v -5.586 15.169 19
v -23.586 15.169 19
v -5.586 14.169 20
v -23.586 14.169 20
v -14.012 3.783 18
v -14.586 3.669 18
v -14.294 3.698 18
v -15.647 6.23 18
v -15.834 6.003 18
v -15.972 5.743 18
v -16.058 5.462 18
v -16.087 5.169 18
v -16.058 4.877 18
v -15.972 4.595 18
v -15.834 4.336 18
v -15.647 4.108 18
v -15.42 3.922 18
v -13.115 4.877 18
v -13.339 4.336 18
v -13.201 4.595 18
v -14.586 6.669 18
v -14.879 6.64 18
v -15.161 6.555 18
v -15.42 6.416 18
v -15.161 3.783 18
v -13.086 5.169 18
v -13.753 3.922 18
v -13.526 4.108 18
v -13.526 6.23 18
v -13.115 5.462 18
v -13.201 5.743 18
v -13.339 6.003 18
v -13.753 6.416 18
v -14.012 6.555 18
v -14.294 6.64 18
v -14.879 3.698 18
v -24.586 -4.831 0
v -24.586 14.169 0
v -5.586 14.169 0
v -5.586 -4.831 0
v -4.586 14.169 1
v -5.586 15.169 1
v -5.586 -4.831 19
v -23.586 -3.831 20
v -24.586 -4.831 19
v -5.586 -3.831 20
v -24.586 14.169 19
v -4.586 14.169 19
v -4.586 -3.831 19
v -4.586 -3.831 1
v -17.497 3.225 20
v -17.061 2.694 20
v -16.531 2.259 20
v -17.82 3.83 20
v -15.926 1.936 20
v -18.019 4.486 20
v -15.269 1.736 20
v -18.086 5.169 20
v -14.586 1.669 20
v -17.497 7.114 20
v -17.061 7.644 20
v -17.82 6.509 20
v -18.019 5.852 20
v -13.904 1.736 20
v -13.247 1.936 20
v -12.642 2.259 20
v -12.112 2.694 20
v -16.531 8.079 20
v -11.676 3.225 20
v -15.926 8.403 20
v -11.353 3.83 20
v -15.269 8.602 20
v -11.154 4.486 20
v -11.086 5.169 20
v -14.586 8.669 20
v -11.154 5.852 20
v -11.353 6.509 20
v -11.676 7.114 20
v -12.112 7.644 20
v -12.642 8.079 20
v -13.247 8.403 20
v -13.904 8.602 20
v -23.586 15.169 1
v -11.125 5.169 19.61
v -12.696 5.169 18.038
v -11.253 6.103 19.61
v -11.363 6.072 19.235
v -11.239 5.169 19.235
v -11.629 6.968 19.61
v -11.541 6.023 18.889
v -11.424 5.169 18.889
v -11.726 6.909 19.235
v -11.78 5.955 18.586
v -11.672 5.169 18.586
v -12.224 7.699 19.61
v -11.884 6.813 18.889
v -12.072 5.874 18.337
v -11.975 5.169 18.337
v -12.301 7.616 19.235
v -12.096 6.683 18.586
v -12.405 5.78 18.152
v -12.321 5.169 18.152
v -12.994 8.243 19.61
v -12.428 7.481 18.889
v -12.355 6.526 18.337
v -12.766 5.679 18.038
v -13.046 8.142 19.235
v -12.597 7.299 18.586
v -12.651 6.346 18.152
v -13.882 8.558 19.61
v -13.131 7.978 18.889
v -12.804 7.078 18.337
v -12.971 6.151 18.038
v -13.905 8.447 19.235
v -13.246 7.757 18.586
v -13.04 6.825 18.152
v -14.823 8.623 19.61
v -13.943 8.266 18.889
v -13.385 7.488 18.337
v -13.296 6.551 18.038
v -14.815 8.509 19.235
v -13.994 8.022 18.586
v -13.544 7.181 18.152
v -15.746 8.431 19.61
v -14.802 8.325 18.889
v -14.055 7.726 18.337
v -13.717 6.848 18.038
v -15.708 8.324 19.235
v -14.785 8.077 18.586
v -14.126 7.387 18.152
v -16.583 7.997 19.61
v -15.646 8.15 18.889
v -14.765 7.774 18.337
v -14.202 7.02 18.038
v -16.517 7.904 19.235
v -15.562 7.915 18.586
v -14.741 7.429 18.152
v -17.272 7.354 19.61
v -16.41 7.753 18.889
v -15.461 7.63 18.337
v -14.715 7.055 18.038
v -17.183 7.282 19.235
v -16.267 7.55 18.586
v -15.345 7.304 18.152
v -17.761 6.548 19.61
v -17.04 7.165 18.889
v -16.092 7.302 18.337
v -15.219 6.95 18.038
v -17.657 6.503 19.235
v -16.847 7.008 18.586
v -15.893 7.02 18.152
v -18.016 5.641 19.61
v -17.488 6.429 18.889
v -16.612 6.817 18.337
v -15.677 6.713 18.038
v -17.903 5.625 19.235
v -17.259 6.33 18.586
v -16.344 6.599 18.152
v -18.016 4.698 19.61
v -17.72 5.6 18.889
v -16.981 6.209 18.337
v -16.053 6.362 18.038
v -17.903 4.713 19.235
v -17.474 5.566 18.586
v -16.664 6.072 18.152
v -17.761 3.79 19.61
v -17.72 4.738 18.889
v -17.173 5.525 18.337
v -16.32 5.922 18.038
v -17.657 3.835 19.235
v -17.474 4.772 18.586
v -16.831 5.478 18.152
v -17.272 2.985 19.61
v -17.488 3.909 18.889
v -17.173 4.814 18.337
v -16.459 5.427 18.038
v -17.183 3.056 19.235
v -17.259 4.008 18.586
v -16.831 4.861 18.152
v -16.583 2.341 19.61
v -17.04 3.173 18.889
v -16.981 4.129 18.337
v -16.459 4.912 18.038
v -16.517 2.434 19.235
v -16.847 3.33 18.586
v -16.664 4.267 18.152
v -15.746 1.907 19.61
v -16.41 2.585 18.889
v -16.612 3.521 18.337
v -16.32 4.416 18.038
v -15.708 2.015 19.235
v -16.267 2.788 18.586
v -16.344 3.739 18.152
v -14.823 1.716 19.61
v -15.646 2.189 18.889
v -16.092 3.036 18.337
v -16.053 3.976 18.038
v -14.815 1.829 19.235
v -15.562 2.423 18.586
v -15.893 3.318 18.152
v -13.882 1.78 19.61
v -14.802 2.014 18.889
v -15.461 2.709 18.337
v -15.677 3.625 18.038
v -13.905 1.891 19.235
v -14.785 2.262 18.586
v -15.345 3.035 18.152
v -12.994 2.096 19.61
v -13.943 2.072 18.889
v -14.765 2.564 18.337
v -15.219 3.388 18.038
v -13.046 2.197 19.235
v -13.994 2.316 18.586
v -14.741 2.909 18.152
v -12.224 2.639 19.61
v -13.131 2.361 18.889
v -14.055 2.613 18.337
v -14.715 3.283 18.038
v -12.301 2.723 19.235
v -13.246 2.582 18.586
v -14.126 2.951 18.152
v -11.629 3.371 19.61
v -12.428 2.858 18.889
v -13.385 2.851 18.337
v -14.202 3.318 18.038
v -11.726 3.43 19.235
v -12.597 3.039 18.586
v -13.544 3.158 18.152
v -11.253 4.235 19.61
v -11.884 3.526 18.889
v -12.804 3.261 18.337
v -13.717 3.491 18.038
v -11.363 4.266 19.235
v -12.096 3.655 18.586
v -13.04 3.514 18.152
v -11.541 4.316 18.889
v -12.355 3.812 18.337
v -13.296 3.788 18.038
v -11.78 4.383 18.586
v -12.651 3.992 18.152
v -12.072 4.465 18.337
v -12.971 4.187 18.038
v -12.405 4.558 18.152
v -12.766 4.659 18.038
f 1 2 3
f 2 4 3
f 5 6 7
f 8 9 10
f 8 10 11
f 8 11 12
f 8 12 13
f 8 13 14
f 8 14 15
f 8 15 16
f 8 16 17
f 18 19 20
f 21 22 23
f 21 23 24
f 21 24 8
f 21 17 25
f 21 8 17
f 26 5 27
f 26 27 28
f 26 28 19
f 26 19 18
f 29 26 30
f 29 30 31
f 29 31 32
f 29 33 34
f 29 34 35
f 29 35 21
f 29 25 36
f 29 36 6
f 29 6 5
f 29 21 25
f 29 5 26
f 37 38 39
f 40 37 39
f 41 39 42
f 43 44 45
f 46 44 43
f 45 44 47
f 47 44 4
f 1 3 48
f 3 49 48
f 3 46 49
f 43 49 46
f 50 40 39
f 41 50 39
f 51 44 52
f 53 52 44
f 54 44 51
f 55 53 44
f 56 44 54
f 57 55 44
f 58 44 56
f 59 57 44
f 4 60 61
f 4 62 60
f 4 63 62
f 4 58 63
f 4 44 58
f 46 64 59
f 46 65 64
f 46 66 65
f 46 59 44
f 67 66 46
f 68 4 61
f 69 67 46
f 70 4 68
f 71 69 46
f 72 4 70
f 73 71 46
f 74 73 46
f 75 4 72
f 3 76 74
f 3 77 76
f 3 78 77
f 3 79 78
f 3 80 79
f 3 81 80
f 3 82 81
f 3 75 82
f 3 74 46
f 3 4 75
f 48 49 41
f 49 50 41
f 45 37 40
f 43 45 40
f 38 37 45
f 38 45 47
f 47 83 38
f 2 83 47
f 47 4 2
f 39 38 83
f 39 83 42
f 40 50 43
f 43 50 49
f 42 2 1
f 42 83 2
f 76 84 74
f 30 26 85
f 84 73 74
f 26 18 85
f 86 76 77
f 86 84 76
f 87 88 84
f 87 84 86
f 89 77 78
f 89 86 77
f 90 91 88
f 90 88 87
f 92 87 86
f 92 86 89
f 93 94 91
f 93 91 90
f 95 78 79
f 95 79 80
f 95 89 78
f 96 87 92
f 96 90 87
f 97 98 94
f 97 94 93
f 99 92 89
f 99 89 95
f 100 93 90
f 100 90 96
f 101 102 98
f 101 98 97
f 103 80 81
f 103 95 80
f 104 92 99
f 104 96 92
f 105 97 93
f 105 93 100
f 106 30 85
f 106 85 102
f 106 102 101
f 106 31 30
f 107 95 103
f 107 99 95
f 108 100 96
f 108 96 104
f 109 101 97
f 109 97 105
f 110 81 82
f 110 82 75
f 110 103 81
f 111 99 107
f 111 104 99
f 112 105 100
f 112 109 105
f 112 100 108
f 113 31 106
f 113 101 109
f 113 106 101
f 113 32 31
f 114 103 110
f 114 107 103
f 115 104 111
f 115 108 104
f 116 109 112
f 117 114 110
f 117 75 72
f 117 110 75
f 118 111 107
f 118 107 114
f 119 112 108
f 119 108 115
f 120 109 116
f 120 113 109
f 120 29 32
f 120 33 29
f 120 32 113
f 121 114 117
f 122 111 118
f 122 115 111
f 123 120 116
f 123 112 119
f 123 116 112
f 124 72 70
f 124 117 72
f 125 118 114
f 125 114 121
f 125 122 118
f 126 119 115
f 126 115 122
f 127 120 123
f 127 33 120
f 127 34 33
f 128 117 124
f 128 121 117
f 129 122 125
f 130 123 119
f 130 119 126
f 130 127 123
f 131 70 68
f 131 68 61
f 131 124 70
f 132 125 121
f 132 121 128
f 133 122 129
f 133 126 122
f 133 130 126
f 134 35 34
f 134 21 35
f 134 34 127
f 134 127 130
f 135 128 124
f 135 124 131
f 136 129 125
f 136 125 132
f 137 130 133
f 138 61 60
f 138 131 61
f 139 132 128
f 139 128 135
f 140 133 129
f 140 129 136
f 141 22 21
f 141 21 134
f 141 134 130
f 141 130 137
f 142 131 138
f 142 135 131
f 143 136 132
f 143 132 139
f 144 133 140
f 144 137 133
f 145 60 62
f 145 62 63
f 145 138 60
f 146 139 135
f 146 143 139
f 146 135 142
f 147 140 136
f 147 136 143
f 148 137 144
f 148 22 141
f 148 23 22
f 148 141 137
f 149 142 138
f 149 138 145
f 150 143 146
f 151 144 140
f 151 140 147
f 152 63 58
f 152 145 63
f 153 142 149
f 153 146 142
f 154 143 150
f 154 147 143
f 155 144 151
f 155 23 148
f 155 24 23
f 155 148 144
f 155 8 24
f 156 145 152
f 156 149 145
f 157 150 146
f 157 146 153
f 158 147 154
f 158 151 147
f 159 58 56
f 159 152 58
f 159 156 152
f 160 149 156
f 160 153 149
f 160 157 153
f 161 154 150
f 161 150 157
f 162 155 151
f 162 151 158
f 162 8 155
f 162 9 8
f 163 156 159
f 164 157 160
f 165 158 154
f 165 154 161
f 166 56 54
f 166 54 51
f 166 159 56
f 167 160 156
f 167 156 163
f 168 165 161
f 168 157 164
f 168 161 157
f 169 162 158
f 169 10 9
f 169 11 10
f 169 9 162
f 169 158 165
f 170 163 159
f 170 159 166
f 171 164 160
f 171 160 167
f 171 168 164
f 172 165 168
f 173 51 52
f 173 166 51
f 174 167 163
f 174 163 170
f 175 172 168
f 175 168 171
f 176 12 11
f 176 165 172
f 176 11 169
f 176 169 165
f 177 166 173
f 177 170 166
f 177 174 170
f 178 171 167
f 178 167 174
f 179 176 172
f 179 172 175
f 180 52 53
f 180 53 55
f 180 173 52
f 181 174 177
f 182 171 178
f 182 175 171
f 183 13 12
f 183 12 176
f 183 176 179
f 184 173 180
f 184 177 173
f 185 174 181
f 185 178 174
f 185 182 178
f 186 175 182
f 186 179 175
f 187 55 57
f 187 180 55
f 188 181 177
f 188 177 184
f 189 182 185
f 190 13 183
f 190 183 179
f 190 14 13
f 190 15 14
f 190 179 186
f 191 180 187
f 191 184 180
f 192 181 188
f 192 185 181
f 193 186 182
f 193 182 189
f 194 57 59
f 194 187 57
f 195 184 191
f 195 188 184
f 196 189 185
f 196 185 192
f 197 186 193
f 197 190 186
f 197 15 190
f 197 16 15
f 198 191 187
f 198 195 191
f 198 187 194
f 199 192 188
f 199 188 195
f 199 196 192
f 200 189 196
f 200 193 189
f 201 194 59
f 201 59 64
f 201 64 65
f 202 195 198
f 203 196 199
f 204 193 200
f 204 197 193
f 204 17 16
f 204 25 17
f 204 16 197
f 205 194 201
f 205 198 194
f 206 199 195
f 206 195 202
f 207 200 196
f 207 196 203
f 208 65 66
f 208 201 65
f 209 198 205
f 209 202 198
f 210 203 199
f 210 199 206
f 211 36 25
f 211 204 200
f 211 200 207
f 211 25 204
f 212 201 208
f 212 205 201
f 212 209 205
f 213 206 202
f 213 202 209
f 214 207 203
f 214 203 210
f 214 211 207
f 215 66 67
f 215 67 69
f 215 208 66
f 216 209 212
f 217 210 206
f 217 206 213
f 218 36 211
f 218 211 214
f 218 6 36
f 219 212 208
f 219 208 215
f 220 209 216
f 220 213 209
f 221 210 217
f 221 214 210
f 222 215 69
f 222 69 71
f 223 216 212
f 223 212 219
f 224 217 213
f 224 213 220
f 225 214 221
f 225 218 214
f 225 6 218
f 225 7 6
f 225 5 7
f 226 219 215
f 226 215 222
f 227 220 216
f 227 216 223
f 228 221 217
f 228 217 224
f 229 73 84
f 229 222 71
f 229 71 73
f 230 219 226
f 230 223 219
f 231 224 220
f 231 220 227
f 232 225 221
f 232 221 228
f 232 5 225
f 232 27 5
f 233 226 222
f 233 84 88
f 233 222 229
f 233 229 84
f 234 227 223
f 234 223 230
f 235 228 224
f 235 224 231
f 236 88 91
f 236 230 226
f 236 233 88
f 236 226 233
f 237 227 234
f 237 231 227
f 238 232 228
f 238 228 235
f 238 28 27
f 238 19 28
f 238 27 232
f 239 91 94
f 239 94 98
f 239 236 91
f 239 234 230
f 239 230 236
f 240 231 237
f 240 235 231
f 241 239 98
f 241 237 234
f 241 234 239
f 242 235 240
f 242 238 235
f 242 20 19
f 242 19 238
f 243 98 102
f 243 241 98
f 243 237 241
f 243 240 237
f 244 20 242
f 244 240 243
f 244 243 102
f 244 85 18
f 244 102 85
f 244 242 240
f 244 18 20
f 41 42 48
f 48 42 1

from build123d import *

# Parameters (mm, degrees)
SKETCH_2_W          = 20
SKETCH_2_H          = 20
EXTRUDE_1_DEPTH     = 20
CHAMFER_2_SIZE      = 1
SKETCH_3_R          = 3.5
CUT_EXTRUDE_1_DEPTH = 2
FILLET_1_R          = 2


with BuildPart() as part:
    # ｽｹｯﾁ2 → ﾎﾞｽ - 押し出し1 (new body)
    with BuildSketch(Plane.XY):
        with Locations((-14.586466165, 5.169172932)):
            Rectangle(SKETCH_2_W, SKETCH_2_H)
    extrude(amount=EXTRUDE_1_DEPTH)

    # 面取り2
    chamfer_2_edges = [part.edges().sort_by_distance(p)[0] for p in [
        (-4.586466165, 5.169172932, 20),
        (-14.586466165, 15.169172932, 20),
        (-24.586466165, 5.169172932, 20),
        (-14.586466165, 15.169172932, 0),
        (-4.586466165, 5.169172932, 0),
        (-24.586466165, 15.169172932, 10),
        (-4.586466165, 15.169172932, 10),
        (-4.586466165, -4.830827068, 10),
        (-14.586466165, -4.830827068, 20),
    ]]
    chamfer(chamfer_2_edges, length=CHAMFER_2_SIZE)

    # ｽｹｯﾁ3 → ｶｯﾄ - 押し出し1 (cut)
    with BuildSketch(Plane.XY.offset(20)):
        with Locations((-14.586466165, 5.169172932)):
            Circle(SKETCH_3_R)
    extrude(amount=-CUT_EXTRUDE_1_DEPTH, mode=Mode.SUBTRACT)

    # ﾌｨﾚｯﾄ1
    fillet_1_edges = [part.edges().sort_by_distance(p)[0] for p in [
        (-18.086466165, 5.169172932, 18),
    ]]
    fillet(fillet_1_edges, radius=FILLET_1_R - 0.0001)  # a hair under: the kernel refuses the full size


solid = part.part
